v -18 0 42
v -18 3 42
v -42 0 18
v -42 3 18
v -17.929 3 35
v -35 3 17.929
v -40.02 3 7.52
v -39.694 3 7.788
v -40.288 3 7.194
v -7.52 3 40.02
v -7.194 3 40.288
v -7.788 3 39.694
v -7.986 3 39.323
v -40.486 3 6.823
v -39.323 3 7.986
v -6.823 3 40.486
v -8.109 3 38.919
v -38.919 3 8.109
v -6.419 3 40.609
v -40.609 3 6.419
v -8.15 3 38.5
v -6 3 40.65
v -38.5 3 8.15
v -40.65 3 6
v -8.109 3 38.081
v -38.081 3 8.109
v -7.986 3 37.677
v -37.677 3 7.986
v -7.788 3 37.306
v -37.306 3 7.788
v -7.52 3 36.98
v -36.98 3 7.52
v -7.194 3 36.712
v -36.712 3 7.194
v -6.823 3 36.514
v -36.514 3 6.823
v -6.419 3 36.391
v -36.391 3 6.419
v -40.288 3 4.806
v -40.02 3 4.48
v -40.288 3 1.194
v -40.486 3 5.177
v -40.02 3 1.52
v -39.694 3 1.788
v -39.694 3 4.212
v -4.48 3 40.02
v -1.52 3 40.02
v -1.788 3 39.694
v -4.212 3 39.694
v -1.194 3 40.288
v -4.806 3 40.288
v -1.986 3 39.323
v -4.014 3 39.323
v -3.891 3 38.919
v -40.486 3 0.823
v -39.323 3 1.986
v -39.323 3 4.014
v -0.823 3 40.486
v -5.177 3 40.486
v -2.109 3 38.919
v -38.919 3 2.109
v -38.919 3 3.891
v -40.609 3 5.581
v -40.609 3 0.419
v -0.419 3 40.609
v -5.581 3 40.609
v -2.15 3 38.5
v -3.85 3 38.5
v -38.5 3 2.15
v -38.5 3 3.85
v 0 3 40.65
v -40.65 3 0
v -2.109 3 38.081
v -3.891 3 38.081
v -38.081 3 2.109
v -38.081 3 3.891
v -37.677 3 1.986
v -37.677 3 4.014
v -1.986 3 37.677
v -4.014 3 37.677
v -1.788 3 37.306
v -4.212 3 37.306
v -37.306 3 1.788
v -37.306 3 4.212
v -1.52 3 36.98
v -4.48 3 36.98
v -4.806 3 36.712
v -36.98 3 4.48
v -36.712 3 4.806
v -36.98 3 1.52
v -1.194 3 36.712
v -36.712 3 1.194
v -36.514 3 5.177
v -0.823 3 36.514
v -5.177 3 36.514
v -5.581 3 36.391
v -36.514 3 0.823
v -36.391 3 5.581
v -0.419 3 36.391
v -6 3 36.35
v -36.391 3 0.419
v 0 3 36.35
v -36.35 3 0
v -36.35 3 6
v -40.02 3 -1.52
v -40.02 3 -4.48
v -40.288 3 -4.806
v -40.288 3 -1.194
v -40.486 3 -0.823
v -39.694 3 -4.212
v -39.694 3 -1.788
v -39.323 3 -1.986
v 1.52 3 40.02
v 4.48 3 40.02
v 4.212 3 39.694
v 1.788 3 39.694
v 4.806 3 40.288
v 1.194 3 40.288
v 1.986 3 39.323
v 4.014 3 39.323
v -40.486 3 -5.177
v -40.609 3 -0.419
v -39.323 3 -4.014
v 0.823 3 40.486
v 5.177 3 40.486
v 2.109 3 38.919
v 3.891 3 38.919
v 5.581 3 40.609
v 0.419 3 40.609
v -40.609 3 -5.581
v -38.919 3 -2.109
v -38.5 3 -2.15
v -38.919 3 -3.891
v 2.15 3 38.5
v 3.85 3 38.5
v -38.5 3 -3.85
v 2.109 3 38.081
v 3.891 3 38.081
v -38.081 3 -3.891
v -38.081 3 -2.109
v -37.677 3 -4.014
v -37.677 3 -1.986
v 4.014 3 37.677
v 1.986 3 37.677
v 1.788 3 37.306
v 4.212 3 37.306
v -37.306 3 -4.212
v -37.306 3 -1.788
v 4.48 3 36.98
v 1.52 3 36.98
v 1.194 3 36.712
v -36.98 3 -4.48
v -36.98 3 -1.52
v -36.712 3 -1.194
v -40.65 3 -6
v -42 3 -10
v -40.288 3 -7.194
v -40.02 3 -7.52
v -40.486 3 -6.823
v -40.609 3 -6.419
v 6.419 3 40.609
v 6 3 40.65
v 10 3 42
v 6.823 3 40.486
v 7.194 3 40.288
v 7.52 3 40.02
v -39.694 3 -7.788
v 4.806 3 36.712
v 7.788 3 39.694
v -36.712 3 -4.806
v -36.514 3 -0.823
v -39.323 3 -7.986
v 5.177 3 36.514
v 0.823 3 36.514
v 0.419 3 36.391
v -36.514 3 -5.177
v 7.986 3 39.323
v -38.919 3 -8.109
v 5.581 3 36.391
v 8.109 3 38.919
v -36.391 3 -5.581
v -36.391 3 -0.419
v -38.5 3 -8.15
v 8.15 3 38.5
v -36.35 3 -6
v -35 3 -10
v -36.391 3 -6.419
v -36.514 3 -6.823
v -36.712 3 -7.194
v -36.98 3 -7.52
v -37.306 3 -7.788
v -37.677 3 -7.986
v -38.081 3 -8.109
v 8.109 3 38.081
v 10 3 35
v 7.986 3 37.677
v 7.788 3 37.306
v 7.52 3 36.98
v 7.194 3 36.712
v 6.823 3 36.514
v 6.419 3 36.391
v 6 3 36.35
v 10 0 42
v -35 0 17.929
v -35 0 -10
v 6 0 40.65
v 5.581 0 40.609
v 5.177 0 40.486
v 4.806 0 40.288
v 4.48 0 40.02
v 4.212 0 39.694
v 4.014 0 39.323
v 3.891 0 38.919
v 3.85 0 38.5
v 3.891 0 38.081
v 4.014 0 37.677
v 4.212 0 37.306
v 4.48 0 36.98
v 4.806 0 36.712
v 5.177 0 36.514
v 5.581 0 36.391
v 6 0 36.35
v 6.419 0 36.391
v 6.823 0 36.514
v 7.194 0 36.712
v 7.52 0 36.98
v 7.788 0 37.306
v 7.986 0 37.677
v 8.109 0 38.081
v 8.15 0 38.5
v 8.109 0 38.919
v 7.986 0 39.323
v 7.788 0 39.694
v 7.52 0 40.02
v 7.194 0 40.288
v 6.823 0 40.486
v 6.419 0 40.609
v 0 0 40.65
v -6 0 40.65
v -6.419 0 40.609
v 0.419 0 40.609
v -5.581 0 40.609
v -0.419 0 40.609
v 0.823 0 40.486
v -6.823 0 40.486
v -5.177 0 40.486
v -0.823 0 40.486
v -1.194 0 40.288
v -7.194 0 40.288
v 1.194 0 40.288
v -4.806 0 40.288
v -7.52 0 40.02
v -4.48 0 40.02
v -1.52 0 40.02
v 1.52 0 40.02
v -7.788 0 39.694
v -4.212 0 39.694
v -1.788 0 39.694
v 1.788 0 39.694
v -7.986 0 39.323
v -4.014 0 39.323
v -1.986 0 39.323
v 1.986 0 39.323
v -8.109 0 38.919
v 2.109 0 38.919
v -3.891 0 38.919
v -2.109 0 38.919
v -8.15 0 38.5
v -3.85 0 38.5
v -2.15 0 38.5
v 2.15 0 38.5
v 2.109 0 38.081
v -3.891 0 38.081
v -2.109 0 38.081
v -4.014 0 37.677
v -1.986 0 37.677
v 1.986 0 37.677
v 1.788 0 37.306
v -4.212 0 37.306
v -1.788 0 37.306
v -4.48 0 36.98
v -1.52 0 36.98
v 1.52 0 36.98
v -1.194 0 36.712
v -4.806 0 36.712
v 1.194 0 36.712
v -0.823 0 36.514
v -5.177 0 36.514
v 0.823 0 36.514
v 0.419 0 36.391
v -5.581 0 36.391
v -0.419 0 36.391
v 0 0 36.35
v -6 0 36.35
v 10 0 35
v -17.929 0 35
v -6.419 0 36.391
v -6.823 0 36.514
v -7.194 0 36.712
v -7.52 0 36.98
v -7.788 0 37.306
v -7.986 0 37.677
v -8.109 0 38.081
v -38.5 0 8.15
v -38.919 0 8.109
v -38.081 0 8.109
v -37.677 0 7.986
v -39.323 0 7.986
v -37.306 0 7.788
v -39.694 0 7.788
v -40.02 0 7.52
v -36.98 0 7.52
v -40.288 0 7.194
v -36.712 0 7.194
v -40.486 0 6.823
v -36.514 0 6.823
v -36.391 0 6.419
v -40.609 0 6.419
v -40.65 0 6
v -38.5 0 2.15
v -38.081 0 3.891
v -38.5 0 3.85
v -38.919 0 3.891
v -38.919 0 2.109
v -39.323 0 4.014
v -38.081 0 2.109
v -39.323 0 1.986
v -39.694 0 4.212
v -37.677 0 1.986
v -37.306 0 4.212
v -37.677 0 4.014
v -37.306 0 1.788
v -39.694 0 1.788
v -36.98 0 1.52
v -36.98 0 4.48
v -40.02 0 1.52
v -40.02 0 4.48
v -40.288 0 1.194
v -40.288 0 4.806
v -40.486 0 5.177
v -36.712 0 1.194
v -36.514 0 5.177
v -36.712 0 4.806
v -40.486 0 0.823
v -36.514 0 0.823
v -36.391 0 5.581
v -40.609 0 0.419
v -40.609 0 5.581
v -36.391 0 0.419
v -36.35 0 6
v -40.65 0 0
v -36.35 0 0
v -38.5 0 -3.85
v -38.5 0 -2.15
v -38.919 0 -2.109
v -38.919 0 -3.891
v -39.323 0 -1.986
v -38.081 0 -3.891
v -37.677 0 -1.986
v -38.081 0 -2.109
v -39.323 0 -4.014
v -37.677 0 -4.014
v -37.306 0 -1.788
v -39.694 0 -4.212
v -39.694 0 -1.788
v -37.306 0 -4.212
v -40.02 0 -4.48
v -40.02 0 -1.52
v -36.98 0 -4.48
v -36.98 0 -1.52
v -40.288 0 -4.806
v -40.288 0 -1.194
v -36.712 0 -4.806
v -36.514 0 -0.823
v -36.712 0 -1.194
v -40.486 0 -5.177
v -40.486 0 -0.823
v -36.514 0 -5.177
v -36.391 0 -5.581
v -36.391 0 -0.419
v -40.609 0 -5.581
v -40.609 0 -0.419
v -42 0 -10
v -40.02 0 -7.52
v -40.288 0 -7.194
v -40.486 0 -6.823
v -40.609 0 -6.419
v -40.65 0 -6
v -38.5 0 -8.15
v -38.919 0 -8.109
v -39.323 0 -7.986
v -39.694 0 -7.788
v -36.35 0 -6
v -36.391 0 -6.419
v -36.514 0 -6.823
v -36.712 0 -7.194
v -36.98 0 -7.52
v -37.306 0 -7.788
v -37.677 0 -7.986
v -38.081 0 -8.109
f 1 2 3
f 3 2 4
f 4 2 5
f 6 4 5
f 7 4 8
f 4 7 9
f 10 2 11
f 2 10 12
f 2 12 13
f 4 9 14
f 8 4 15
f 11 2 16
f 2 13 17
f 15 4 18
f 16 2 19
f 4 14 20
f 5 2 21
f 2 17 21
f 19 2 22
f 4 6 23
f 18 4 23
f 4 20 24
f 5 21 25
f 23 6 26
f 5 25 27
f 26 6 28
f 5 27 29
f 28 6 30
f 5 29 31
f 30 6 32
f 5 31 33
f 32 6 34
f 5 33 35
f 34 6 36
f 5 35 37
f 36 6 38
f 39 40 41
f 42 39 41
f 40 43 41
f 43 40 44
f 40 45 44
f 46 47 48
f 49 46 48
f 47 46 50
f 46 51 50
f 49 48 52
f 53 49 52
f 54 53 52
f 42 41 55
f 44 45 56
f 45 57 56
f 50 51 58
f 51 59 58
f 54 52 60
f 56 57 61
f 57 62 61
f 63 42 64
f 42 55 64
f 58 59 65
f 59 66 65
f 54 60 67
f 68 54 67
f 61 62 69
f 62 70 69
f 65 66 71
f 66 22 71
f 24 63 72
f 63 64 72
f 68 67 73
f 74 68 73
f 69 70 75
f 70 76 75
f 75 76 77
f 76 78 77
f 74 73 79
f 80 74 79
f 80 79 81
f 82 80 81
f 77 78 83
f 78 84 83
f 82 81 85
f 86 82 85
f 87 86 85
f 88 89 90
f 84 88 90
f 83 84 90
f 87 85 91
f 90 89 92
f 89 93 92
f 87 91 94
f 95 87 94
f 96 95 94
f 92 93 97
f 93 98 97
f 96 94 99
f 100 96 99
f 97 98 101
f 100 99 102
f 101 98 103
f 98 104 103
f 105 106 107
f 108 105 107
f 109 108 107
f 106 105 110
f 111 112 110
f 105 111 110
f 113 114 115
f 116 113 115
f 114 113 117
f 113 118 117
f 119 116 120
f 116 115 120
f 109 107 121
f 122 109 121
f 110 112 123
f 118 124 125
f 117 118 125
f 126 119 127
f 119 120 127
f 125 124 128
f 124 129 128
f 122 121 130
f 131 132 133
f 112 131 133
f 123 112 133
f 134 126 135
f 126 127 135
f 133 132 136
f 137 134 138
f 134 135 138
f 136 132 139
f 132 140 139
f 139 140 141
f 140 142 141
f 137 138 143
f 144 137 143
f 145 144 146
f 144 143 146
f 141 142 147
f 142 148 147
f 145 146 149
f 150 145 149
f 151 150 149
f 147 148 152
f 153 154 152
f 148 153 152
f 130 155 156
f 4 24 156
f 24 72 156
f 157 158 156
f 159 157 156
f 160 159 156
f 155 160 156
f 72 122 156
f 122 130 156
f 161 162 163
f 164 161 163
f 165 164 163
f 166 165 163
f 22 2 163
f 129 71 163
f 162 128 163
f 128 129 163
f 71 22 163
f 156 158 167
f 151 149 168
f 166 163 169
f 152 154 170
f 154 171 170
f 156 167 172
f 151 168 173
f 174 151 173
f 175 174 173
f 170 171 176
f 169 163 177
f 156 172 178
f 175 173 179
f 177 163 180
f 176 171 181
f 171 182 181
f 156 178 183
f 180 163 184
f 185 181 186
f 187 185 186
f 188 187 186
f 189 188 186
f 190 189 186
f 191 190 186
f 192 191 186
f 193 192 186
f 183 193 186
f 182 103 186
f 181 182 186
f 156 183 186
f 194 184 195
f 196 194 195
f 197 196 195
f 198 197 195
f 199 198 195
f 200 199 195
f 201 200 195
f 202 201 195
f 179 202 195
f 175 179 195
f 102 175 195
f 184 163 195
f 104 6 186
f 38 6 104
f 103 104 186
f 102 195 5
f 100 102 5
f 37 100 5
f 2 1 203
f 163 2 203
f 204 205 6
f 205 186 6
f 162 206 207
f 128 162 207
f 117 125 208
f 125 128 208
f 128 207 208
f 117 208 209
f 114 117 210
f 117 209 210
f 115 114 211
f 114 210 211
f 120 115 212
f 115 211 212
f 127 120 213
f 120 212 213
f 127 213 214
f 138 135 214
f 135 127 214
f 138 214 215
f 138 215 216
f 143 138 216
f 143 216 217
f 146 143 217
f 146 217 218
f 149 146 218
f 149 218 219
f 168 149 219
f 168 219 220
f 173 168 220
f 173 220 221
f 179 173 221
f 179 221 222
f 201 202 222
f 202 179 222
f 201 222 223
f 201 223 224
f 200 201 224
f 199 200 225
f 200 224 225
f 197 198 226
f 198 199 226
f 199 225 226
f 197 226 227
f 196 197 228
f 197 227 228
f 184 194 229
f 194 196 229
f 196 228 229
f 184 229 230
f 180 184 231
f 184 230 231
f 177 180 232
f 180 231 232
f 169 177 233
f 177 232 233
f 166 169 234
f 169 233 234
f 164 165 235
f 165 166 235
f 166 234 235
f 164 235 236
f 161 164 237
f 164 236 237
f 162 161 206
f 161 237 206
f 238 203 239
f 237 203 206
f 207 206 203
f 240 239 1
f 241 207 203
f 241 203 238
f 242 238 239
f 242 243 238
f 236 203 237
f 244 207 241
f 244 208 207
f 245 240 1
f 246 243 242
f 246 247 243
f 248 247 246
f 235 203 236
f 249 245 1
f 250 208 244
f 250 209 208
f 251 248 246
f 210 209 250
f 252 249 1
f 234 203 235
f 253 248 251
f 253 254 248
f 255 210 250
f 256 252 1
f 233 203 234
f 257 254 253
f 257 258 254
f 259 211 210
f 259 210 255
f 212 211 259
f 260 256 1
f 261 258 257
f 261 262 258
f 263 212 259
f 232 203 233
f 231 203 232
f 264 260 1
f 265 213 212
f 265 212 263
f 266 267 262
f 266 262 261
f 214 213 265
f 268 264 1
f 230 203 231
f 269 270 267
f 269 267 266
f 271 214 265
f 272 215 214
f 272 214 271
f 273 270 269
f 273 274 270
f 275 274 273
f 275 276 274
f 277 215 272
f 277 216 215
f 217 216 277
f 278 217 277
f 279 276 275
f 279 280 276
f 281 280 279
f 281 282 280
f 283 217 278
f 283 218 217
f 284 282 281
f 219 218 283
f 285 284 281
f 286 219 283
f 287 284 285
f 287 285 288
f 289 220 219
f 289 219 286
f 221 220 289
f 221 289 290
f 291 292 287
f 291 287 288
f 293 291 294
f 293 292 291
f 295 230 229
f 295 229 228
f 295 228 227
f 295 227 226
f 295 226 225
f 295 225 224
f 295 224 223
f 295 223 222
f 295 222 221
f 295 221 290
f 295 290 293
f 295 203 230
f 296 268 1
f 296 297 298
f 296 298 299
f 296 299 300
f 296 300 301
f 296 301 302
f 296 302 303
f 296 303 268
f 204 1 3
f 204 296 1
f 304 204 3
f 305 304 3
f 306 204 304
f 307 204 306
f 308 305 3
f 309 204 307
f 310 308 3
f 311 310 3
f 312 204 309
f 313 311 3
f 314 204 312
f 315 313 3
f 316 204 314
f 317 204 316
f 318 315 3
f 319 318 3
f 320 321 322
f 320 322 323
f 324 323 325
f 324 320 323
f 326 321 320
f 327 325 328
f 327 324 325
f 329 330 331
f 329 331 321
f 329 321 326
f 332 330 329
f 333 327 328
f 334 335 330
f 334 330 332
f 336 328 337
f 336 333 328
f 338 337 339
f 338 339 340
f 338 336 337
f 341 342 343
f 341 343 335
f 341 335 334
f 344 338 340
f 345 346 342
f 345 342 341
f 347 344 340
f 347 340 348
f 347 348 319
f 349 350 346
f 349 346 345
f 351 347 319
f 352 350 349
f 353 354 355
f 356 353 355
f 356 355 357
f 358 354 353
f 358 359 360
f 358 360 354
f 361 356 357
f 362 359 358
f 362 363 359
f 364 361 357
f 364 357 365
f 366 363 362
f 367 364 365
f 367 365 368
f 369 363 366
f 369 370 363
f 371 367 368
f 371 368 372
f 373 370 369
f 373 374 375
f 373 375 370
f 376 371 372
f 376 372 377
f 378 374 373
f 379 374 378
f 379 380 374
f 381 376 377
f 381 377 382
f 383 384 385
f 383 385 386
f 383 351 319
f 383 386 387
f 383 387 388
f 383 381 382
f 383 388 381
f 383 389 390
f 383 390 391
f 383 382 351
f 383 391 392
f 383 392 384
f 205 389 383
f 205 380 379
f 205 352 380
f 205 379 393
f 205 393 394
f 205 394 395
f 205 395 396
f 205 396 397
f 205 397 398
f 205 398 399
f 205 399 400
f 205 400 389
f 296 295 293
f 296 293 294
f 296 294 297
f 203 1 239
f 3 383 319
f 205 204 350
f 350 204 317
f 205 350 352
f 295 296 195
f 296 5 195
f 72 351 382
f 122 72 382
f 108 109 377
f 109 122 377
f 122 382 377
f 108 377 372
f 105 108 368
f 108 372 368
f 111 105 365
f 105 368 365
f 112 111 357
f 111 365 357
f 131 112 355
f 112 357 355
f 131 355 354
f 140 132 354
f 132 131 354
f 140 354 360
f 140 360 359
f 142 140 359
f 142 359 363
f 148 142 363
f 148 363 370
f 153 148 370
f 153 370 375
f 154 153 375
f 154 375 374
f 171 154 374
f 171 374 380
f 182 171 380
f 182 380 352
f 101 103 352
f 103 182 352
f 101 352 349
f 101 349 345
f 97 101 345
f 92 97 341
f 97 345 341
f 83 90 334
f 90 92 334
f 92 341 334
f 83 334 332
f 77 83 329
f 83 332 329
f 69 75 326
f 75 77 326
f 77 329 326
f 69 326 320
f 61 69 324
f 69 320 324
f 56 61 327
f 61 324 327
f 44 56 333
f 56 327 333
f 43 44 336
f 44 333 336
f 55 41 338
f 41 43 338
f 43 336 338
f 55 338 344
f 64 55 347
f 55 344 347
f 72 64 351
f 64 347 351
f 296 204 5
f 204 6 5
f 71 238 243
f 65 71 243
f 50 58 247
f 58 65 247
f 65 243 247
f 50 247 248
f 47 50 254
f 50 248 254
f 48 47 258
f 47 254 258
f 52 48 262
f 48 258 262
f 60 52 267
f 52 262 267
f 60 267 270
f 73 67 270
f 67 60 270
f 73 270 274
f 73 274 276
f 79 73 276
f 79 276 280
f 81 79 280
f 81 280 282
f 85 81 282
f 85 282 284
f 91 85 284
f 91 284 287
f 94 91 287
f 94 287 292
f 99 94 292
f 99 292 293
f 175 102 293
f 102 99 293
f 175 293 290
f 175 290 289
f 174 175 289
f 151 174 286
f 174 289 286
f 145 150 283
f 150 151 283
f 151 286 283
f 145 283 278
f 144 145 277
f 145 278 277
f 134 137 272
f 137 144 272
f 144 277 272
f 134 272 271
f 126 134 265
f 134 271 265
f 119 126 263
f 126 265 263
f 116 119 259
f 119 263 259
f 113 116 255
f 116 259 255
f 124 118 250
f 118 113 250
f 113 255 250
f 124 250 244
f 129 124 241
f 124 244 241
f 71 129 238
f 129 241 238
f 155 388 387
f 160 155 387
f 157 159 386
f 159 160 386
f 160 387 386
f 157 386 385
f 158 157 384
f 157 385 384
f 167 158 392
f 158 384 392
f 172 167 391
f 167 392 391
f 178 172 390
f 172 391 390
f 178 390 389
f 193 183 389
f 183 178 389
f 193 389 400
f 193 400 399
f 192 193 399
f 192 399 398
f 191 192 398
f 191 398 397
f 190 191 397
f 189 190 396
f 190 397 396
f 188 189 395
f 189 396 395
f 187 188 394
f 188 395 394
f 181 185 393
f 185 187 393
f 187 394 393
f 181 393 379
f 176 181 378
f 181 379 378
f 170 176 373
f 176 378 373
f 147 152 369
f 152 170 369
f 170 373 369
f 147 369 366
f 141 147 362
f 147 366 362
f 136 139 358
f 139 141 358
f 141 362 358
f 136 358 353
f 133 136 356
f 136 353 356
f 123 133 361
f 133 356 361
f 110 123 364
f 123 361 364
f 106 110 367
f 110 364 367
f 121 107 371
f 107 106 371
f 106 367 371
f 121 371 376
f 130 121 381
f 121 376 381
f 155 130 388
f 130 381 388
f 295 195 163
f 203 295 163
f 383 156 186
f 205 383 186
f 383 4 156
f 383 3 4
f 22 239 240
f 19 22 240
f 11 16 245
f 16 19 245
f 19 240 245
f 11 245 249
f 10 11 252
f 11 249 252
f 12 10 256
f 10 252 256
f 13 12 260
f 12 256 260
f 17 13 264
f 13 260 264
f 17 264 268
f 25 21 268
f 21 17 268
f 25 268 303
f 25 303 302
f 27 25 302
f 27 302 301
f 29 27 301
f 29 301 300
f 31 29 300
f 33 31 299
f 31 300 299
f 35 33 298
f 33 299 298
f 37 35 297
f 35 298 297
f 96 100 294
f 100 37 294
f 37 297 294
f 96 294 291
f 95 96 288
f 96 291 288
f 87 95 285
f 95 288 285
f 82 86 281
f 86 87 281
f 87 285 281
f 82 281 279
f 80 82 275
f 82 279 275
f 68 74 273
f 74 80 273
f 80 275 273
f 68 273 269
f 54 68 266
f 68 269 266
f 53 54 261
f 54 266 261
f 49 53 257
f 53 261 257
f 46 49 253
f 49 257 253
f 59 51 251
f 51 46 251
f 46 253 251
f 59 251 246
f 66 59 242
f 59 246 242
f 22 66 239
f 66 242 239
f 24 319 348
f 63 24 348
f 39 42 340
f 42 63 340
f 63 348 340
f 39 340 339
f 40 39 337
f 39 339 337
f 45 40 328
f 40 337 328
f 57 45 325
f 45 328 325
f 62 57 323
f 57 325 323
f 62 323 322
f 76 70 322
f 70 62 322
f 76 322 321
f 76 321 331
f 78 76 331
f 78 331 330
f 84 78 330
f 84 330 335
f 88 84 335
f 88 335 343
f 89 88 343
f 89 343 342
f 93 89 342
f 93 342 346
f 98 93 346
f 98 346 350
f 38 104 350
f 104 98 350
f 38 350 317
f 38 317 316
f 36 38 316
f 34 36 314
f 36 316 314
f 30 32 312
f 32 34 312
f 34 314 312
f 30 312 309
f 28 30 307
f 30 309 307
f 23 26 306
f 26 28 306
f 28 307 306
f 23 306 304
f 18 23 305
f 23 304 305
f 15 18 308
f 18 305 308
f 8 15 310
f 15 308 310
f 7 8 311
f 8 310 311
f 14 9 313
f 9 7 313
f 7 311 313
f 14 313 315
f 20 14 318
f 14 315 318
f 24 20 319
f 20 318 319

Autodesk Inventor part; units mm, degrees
ref_plane "YZ Plane" through (0, 0, 0) normal (1, 0, 0) x (0, 1, 0)
ref_plane "XZ Plane" through (0, 0, 0) normal (0, 1, 0) x (-1, 0, 0)
ref_plane "XY Plane" through (0, 0, 0) normal (0, 0, 1) x (1, 0, 0)
sketch "Esquisse1" plane through (0, 0, 0) normal (0, 1, 0) x (-1, 0, 0)
  line L0 (35, 35) -> (35, 14)
  line L1 (35, 14) -> (42, 10)
  line L2 (42, 10) -> (42, 0)
  line L3 (35, 35) -> (0, 0)
  line L4 (42, 0) -> (0, 0) construction
  line L5 (35, -35) -> (35, -14)
  line L6 (35, -14) -> (42, -10)
  line L7 (42, -10) -> (42, 0)
  line L8 (35, -35) -> (0, 0)
  line L9 (38.5, -12) -> (38.5, 12) construction
  circle A0 centre (38.5, 0) radius 2.15
  circle A1 centre (38.5, 6) radius 2.15
  circle A2 centre (38.5, -6) radius 2.15
  dimension "d0" = 90
  dimension "d1" = 70
  dimension "d4" = 6
  dimension "d11" = 6
  dimension "d16" = 4.3
  dimension "d17" = 20
  dimension "d18" = 4
  dimension "d19" = 7
extrude "Extrusion1" add sketch "Esquisse1" along normal blind 3
pattern_circular "Réseau circulaire1" count 4 over 360 about axis through (0, 0, 0) along (0, 1, 0) of "Extrusion1"
ref_plane "Plan de construction2" through (0, 0, -14) normal (1, 0, 0) x (0, 0, -1)
ref_plane "Plan de construction3" through (-14, 0, 0) normal (0, 0, -1) x (-1, 0, 0)
chamfer "Chanfrein1" distance 10 angle 45 4 edges at (-35, 1.5, -35) (-35, 1.5, 35) (35, 1.5, -35) (35, 1.5, 35)
sketch "Esquisse3" plane through (0, 0, 0) normal (0, -1, 0) x (1, 0, 0)
  circle A0 centre (0, 38.5) radius 2.15 construction
  circle A1 centre (6, 38.5) radius 2.15 construction
  circle A2 centre (-6, 38.5) radius 2.15 construction
  circle A3 centre (38.5, 6) radius 2.15 construction
  circle A4 centre (38.5, -6) radius 2.15 construction
  circle A5 centre (38.5, 0) radius 2.15 construction
  circle A6 centre (6, -38.5) radius 2.15 construction
  circle A7 centre (-6, -38.5) radius 2.15 construction
  circle A8 centre (0, -38.5) radius 2.15 construction
  circle A9 centre (-38.5, -6) radius 2.15 construction
  circle A10 centre (-38.5, 6) radius 2.15 construction
  circle A11 centre (-38.5, 0) radius 2.15 construction
  line L0 (-35, 25) -> (-35, 14) construction
  line L1 (-35, 14) -> (-42, 10) construction
  line L2 (-42, 10) -> (-42, -10) construction
  line L3 (-42, -10) -> (-35, -14) construction
  line L4 (-35, -14) -> (-35, -25) construction
  line L5 (-25, -35) -> (-14, -35) construction
  line L6 (-14, -35) -> (-10, -42) construction
  line L7 (-10, -42) -> (10, -42) construction
  line L8 (10, -42) -> (14, -35) construction
  line L9 (14, -35) -> (25, -35) construction
  line L10 (35, -25) -> (35, -14) construction
  line L11 (35, -14) -> (42, -10) construction
  line L12 (42, -10) -> (42, 10) construction
  line L13 (42, 10) -> (35, 14) construction
  line L14 (35, 14) -> (35, 25) construction
  line L15 (25, 35) -> (14, 35) construction
  line L16 (14, 35) -> (10, 42) construction
  line L17 (10, 42) -> (-10, 42) construction
  line L18 (-10, 42) -> (-14, 35) construction
  line L19 (-14, 35) -> (-25, 35) construction
  line L20 (-51.72, -12.8291) -> (-12.8291, -51.72)
  line L21 (-12.8291, -51.72) -> (-10, -42)
  line L22 (-42, -10) -> (-51.72, -12.8291)
  line L23 (-35, -14) -> (-42, -10)
  line L24 (-42, -10) -> (-35, -14) projected
  line L25 (-10, -42) -> (-14, -35)
  line L26 (-14, -35) -> (-10, -42) projected
  line L27 (25, 35) -> (35, 25) projected
  line L28 (-35, 25) -> (-25, 35) projected
  line L29 (-25, -35) -> (-35, -25) projected
  line L30 (35, -25) -> (25, -35) projected
  line L31 (-14, -35) -> (-35, -14)
  point P0 (0, 0)
  dimension "d32" = 135
  dimension "d33" = 55
extrude "Extrusion3" add sketch "Esquisse3" against normal blind 3
sketch "Esquisse4" plane through (-51.72, 0, -12.8291) normal (-0.7071, 0, -0.7071) x (-0.7071, 0, 0.7071)
  line L0 (0, 0) -> (-55, 0) construction
  line L1 (0, 0) -> (0, 3) construction
  line L2 (-55, 3) -> (0, 3) construction
  line L3 (-55, 0) -> (-55, 3) construction
  line L4 (0, 0) -> (-55, 0)
  line L5 (-55, 0) -> (-55, 24)
  line L6 (-55, 24) -> (0, 24)
  line L7 (0, 24) -> (0, 0)
  point P0 (-27.5, 0)
  dimension "d36" = 24
extrude "Extrusion4" add sketch "Esquisse4" along normal blind 3
sketch "Esquisse5" plane through (-53.8413, 0, -14.9504) normal (-0.7071, 0, -0.7071) x (-0.7071, 0, 0.7071)
  line L0 (-55, 0) -> (0, 0) construction
  line L1 (0, 0) -> (0, 24) construction
  line L2 (0, 24) -> (-55, 24) construction
  line L3 (-55, 24) -> (-55, 0) construction
  line L4 (0, 0) -> (0, 24) construction
  line L5 (0, 9.2801) -> (-55, 9.2801) construction
  circle A0 centre (-15.1412, 9.2801) radius 7.3571
  line L6 (-27.5, 0) -> (-27.5, 24) construction
  circle A1 centre (-39.8588, 9.2801) radius 7.3571
extrude "Extrusion5" cut sketch "Esquisse5" against normal blind 1
pattern_circular "Réseau circulaire2" count 4 over 360 about axis through (0, 0, 0) along (0, -1, 0) of "Extrusion3", "Extrusion4"
fillet "Congé1" radius 3 2 edges at (-34.3959, 0, 34.3959) (34.3959, 0, -34.3959)
sketch "Esquisse13" plane through (0, 3, 0) normal (0, 1, 0) x (1, 0, 0)
  line L0 (-10, -42) -> (10, -42) construction
  line L1 (10, -42) -> (12.8291, -51.72) construction
  line L2 (12.8291, -51.72) -> (51.72, -12.8291) construction
  line L3 (51.72, -12.8291) -> (42, -10) construction
  line L4 (42, -10) -> (42, 10) construction
  line L5 (42, 10) -> (51.72, 12.8291) construction
  line L6 (51.72, 12.8291) -> (12.8291, 51.72) construction
  line L7 (12.8291, 51.72) -> (10, 42) construction
  line L8 (10, 42) -> (-10, 42) construction
  line L9 (-10, 42) -> (-12.8291, 51.72) construction
  line L10 (-12.8291, 51.72) -> (-51.72, 12.8291) construction
  line L11 (-51.72, 12.8291) -> (-42, 10) construction
  line L12 (-42, 10) -> (-42, -10) construction
  line L13 (-42, -10) -> (-51.72, -12.8291) construction
  line L14 (-51.72, -12.8291) -> (-12.8291, -51.72) construction
  line L15 (-12.8291, -51.72) -> (-10, -42) construction
  circle A0 centre (0, -38.5) radius 2.15 construction
  circle A1 centre (6, -38.5) radius 2.15 construction
  circle A2 centre (-6, -38.5) radius 2.15 construction
  circle A3 centre (38.5, -6) radius 2.15 construction
  circle A4 centre (38.5, 6) radius 2.15 construction
  circle A5 centre (38.5, 0) radius 2.15 construction
  circle A6 centre (6, 38.5) radius 2.15 construction
  circle A7 centre (-6, 38.5) radius 2.15 construction
  circle A8 centre (0, 38.5) radius 2.15 construction
  circle A9 centre (-38.5, 6) radius 2.15 construction
  circle A10 centre (-38.5, -6) radius 2.15 construction
  circle A11 centre (-38.5, 0) radius 2.15 construction
  line L16 (10, -42) -> (-18, -42)
  line L17 (-18, -42) -> (-42, -18)
  line L18 (-42, -18) -> (-42, 10)
  line L19 (-42, -10) -> (-42, 10) projected
  line L20 (-42, 10) -> (-35, 10)
  line L21 (-35, 10) -> (-35, -17.9289)
  line L22 (-35, -17.9289) -> (-17.9289, -35)
  line L23 (-17.9289, -35) -> (10, -35)
  line L24 (10, -35) -> (10, -42)
  line L25 (-10, -42) -> (10, -42) projected
  dimension "d97" = 7
  dimension "d98" = 5
  dimension "d99" = 28
extrude "Extrusion11" cut sketch "Esquisse13" against normal blind 10 keep common part
properties part number "renfort"
